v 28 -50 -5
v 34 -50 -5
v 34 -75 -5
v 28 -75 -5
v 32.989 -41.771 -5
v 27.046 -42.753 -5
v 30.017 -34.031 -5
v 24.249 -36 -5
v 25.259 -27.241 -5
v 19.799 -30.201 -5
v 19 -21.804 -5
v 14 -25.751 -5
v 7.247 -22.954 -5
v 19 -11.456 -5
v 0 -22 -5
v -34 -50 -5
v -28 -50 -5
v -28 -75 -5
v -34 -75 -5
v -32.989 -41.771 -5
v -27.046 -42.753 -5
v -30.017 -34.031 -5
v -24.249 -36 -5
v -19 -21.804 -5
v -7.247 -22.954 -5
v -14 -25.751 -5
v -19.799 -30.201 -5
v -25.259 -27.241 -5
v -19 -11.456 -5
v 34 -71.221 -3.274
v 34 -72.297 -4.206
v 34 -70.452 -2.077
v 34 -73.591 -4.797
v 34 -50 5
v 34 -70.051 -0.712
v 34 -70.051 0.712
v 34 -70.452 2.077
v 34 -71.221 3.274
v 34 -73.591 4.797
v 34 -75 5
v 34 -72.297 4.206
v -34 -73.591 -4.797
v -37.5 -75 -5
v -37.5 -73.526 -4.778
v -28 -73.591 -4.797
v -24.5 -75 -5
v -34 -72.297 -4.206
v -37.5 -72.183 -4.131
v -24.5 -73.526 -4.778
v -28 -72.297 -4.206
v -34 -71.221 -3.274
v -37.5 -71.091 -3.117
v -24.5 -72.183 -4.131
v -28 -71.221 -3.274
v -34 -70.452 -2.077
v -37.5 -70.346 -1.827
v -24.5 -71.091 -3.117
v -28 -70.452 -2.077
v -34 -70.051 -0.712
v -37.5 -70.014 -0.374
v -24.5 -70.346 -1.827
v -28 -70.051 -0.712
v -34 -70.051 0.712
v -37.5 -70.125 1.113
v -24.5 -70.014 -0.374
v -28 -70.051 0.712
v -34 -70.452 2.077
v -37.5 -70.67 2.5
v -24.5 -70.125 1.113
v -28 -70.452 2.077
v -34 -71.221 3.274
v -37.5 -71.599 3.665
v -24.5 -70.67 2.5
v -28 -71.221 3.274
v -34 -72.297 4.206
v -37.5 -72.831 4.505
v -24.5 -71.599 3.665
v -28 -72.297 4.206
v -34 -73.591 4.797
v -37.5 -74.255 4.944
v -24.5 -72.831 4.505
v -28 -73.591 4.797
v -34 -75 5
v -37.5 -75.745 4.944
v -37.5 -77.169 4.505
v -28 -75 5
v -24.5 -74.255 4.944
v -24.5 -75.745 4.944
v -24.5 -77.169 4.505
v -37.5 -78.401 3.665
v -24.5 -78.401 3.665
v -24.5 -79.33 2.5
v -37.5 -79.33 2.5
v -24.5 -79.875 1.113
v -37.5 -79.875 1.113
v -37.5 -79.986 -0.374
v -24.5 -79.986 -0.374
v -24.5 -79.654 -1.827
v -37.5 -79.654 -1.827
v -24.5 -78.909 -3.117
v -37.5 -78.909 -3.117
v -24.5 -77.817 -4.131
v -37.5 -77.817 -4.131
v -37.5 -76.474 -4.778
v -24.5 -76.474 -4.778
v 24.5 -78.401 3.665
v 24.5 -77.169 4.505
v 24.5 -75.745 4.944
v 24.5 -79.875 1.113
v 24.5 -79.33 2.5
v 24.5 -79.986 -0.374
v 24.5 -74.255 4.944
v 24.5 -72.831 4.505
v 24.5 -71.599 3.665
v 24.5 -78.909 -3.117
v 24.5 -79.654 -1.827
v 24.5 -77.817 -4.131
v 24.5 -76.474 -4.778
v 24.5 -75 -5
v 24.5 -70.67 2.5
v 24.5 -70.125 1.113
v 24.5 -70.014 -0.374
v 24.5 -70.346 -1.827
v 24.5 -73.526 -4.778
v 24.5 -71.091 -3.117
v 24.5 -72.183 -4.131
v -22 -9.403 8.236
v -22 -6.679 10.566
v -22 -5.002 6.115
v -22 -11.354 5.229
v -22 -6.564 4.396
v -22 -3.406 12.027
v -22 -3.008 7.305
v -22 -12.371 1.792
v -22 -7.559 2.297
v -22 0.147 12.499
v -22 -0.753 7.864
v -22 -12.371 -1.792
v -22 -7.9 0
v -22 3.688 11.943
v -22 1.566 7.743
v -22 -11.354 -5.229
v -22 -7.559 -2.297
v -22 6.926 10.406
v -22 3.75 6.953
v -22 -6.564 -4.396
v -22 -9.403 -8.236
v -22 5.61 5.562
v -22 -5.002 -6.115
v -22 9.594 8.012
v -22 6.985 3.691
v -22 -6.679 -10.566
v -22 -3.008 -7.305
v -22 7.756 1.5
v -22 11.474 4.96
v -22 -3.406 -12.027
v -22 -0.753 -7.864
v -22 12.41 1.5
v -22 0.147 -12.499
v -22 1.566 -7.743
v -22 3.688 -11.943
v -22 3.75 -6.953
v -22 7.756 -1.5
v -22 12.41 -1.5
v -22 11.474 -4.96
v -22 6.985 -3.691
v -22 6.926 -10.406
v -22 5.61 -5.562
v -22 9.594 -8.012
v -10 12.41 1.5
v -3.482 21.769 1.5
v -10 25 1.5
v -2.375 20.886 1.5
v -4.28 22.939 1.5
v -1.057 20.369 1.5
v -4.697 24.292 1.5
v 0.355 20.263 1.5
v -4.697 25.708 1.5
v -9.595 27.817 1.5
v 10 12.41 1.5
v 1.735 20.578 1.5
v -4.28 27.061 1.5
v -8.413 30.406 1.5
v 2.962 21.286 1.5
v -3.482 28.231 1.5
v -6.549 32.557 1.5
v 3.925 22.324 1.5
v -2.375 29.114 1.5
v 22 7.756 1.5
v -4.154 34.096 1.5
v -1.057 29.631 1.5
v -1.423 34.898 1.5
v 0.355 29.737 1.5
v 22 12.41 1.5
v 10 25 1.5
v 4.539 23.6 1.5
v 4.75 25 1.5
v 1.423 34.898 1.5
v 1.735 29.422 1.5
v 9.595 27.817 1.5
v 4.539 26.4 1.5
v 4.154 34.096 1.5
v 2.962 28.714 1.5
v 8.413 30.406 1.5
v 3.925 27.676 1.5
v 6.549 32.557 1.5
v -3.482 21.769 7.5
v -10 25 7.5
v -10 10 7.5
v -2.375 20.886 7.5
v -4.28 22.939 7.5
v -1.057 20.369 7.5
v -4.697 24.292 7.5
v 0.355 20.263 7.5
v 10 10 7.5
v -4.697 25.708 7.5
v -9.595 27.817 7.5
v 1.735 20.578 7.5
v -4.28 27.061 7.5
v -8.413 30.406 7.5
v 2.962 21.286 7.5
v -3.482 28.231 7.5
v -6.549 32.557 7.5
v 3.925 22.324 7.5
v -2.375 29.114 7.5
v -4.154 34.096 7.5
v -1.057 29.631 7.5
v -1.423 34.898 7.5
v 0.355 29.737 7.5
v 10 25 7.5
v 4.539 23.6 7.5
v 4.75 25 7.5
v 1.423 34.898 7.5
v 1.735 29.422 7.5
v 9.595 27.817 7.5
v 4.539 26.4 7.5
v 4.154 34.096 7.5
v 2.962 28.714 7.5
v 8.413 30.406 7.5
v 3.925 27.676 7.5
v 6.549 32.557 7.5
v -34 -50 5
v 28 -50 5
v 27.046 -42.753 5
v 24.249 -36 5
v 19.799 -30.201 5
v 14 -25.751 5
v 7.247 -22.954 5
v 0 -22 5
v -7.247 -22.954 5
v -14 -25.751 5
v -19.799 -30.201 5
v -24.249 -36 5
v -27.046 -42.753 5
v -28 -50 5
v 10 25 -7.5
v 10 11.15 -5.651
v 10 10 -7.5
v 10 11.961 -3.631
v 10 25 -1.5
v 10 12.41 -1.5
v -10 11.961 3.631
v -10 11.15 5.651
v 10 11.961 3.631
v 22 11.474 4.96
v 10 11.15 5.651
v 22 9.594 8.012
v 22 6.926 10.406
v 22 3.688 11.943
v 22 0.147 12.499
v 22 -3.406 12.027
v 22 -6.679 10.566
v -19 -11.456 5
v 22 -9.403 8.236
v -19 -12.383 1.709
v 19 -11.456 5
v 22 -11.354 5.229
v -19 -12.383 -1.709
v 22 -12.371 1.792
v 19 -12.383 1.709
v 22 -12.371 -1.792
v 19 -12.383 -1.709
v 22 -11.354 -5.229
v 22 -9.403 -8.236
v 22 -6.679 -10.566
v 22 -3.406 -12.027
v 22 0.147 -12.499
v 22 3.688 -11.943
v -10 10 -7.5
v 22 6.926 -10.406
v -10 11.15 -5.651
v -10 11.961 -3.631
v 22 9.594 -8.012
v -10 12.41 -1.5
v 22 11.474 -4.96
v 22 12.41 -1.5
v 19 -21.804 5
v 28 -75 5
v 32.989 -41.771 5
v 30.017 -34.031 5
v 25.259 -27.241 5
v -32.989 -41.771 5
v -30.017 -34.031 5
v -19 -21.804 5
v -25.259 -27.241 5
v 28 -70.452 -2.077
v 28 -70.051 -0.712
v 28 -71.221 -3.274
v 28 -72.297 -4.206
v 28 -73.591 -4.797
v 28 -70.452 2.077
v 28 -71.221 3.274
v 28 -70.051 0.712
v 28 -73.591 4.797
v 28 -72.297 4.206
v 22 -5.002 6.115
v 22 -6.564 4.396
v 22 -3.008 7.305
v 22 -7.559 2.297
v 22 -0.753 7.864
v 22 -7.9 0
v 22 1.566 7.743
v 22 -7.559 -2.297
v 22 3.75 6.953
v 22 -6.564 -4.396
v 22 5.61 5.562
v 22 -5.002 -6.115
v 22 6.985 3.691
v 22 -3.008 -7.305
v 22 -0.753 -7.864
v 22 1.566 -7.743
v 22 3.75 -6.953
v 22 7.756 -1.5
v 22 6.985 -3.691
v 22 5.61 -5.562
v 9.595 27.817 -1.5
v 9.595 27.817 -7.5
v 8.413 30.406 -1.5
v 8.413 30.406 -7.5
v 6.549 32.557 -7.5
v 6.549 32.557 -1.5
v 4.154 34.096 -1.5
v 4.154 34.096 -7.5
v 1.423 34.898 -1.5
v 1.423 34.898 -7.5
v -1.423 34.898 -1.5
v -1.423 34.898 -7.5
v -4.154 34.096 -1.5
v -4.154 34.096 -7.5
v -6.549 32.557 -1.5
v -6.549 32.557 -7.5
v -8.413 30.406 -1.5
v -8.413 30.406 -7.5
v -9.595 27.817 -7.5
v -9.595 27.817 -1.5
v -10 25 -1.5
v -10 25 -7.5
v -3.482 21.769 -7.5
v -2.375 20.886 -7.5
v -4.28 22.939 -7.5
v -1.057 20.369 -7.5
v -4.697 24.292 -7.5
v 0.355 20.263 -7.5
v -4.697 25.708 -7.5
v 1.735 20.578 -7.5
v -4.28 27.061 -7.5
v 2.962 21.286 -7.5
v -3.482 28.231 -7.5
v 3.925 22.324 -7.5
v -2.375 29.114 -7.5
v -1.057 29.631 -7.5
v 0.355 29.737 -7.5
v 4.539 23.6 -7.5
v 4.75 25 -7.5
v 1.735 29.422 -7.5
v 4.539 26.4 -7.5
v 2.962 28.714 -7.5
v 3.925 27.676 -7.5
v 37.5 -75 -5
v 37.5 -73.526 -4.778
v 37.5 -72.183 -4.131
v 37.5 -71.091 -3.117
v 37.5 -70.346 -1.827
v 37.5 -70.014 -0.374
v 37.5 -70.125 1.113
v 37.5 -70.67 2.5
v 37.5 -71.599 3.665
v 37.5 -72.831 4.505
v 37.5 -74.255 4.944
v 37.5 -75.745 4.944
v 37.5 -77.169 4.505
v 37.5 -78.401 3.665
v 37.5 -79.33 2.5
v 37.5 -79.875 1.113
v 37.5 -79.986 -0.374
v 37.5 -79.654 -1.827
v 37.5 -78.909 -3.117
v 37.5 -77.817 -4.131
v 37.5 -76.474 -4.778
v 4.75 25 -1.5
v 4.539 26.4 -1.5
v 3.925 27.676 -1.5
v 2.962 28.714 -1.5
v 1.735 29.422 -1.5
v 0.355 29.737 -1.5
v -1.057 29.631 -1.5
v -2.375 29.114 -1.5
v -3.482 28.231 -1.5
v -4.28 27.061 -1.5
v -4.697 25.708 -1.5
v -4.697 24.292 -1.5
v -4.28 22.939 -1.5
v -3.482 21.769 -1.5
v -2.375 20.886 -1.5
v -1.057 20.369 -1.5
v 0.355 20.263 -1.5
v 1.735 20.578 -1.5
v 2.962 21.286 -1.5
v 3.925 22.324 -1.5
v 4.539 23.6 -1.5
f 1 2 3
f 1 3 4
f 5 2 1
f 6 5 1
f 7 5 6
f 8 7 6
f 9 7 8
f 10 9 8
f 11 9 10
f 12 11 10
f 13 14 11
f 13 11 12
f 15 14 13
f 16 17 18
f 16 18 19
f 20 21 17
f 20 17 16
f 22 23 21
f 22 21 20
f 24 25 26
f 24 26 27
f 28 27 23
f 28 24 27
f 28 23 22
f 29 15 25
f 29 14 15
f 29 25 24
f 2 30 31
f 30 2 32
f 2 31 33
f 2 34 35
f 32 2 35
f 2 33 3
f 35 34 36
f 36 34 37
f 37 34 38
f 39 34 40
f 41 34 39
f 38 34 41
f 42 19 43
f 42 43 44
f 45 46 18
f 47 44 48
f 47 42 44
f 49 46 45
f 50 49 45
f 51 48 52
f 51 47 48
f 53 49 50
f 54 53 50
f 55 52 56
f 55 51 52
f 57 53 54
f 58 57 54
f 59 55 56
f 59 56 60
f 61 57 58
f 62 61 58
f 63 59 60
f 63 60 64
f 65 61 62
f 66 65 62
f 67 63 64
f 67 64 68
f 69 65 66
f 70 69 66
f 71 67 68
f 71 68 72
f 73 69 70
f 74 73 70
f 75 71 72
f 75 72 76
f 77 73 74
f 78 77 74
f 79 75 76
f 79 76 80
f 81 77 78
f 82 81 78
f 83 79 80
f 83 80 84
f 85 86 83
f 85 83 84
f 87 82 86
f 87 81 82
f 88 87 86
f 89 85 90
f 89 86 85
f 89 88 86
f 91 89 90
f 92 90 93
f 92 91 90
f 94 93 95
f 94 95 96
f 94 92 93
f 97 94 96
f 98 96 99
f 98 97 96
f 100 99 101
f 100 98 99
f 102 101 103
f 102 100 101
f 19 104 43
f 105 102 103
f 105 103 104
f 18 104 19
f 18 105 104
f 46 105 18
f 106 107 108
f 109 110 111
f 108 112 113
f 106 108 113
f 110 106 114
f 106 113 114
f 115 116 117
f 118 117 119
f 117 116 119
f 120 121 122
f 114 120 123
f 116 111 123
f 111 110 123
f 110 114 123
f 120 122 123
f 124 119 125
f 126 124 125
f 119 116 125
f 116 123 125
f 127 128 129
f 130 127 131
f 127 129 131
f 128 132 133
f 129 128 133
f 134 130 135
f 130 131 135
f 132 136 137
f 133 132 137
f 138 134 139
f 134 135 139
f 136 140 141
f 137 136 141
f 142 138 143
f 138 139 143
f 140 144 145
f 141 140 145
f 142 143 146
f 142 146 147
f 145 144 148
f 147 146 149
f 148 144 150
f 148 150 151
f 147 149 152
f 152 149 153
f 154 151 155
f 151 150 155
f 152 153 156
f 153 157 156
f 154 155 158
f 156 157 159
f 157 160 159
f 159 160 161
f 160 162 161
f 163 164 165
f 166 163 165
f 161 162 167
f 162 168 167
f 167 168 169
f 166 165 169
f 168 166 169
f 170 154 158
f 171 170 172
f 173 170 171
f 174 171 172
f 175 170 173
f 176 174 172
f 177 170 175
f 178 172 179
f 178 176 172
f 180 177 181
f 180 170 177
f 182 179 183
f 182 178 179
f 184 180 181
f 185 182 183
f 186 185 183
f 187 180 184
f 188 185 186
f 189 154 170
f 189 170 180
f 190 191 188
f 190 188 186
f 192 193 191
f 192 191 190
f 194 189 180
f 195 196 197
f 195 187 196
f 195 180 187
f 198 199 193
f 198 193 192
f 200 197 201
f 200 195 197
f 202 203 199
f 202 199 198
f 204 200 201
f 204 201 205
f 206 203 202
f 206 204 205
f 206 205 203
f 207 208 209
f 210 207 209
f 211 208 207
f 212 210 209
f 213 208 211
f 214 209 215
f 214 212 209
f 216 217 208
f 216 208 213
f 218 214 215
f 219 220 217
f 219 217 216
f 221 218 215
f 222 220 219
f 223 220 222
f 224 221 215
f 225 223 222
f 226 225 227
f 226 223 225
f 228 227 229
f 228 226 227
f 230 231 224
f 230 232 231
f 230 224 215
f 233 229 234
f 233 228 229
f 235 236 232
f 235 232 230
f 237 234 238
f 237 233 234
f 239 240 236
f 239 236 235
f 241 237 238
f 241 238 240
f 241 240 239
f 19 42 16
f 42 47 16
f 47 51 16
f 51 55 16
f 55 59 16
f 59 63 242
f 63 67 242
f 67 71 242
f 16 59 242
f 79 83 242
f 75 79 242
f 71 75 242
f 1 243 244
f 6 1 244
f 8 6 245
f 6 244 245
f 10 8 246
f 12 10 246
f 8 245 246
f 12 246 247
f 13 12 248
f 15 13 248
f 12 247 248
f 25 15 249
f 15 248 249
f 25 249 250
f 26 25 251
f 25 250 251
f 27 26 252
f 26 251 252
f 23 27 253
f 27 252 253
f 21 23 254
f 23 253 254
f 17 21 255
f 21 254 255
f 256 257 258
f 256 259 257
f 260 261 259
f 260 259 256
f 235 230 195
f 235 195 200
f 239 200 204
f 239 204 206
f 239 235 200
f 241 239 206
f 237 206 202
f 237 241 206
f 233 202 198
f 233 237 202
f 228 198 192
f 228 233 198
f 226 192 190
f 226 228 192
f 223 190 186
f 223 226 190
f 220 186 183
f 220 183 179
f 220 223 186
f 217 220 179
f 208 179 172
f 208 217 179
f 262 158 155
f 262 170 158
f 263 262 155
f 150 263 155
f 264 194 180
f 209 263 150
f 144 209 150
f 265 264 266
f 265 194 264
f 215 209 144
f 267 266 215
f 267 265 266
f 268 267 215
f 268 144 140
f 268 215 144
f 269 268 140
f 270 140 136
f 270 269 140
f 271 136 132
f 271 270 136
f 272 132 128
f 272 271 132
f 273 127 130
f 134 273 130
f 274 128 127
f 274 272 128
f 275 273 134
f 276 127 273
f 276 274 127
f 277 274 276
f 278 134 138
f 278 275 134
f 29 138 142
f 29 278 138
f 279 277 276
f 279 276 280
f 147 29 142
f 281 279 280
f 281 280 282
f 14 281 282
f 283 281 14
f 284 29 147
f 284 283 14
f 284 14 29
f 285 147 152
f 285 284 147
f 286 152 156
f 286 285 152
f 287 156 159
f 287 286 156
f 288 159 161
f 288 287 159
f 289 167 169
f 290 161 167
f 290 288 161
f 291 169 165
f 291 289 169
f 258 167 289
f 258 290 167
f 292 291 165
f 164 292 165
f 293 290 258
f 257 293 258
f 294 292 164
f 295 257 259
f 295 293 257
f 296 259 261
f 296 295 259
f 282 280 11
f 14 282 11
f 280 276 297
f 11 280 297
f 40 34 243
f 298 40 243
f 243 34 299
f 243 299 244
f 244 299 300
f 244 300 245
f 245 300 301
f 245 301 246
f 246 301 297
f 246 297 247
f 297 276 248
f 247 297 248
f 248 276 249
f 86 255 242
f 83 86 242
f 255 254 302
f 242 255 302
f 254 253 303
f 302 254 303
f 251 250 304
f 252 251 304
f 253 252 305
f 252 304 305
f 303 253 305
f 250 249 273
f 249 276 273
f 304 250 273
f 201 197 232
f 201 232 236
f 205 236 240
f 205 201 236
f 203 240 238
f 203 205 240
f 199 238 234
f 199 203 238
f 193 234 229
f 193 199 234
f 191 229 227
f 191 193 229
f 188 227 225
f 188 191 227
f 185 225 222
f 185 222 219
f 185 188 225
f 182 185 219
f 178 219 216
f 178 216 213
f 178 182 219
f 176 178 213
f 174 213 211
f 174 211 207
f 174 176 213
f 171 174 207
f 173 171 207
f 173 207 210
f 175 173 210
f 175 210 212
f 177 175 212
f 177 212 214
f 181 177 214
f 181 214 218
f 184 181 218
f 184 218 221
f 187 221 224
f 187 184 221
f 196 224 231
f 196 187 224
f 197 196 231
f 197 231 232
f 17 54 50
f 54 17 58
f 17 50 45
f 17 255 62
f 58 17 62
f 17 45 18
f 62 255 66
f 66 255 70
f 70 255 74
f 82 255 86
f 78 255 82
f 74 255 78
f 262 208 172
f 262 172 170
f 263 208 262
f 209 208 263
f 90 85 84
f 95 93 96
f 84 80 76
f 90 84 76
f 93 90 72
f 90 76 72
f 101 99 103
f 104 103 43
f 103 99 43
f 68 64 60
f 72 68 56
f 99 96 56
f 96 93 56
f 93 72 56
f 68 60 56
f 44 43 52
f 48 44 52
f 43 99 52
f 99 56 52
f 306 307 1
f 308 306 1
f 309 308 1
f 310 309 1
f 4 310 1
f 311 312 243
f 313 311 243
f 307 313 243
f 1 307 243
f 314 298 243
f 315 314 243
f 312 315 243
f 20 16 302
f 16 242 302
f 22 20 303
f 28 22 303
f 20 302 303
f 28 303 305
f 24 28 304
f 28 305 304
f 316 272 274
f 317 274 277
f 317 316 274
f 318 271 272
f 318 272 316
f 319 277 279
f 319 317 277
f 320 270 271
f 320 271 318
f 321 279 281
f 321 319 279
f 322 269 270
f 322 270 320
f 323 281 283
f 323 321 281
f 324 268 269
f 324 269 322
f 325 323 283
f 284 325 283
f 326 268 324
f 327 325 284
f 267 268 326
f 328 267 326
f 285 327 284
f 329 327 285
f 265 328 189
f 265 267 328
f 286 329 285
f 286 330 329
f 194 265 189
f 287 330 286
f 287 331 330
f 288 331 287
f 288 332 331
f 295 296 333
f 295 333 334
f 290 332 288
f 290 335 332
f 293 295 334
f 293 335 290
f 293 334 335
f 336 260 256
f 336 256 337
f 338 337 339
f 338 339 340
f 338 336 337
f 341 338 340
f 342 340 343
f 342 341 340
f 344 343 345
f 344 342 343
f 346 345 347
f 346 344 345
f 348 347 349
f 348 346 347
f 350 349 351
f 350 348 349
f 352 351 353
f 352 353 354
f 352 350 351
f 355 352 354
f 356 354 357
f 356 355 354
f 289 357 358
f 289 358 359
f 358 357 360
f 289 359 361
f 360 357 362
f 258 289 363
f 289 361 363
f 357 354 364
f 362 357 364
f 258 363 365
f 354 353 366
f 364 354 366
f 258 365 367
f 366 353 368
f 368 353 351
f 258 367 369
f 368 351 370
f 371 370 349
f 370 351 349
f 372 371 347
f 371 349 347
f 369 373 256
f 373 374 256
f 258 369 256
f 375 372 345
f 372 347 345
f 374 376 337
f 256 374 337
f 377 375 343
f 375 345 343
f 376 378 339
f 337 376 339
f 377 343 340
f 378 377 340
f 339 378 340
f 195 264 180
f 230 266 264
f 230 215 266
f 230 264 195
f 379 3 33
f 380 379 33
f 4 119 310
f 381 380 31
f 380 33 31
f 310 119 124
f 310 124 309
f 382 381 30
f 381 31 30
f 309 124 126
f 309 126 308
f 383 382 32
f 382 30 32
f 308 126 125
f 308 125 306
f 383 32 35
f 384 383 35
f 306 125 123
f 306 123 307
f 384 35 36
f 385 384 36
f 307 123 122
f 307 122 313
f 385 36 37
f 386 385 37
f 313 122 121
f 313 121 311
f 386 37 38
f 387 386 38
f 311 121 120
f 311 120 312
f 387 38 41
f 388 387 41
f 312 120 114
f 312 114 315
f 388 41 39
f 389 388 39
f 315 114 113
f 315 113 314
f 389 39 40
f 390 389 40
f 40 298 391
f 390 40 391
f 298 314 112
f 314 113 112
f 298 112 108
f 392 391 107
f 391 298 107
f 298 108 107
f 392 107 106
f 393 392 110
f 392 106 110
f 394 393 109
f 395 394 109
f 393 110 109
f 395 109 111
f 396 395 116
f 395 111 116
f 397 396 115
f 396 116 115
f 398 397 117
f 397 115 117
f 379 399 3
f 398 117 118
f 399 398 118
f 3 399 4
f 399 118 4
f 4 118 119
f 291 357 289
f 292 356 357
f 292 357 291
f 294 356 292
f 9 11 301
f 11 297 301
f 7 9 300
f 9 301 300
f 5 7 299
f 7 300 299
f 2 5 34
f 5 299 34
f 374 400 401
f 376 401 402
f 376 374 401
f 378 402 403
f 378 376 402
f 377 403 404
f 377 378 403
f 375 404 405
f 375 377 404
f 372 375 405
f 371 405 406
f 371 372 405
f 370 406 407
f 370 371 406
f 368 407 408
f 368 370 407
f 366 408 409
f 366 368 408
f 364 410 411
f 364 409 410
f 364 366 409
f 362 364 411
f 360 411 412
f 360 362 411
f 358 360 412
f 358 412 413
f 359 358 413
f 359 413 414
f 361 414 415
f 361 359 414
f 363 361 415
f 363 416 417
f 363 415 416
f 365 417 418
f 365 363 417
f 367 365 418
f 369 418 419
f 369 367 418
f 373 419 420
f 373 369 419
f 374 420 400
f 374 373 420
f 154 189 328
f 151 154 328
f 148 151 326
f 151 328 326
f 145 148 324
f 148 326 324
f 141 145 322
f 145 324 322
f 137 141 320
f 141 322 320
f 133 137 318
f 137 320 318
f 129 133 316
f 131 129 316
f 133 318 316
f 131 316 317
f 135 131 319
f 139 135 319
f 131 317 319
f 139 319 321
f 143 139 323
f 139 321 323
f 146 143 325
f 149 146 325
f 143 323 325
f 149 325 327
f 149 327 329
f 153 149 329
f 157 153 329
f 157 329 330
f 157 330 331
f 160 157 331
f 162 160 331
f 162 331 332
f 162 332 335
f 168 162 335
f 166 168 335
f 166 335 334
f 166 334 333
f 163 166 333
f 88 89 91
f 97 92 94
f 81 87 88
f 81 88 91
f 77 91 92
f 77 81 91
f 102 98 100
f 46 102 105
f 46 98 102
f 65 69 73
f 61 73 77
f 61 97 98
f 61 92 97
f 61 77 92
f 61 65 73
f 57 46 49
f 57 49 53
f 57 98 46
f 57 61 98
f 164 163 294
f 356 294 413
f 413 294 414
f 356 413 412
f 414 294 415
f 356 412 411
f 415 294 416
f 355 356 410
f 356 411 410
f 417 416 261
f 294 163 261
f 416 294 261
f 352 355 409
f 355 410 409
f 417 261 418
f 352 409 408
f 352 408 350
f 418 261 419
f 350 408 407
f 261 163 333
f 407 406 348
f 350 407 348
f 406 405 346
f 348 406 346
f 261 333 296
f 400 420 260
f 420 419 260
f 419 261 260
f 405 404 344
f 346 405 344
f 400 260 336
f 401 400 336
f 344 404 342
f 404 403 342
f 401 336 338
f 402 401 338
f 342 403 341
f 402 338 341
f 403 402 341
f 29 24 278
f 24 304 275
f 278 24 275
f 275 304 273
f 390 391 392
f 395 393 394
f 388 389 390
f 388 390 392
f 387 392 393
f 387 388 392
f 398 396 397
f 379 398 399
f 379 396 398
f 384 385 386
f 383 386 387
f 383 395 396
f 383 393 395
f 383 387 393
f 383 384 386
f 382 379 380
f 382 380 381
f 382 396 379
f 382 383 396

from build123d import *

# Parameters (mm, degrees)
SKETCH1_R           = 12.5
BOSS_EXTRUDE1_DEPTH = 22
SKETCH2_R           = 4.75
BOSS_EXTRUDE2_DEPTH = 7.5
BOSS_EXTRUDE3_DEPTH = 5
BOSS_EXTRUDE4_START = -9.5
SKETCH5_R           = 5
BOSS_EXTRUDE4_DEPTH = 13
SKETCH4_R           = 7.9
SKETCH4_W           = 3
SKETCH4_H           = 38
CUT_EXTRUDE1_DEPTH  = 101.481341552


with BuildPart() as part:
    # Sketch1 → Boss-Extrude1 (new, symmetric)
    with BuildSketch(Plane(origin=(0, 0, 0), x_dir=(0, 0, -1), z_dir=(1, 0, 0))):
        Circle(SKETCH1_R)
    extrude(amount=BOSS_EXTRUDE1_DEPTH, both=True)

    # Sketch2 → Boss-Extrude2 (add, symmetric)
    with BuildSketch(Plane.XY):
        with BuildLine():
            Line((-10, 25), (-10, 0))
            Line((-10, 0), (10, 0))
            Line((10, 0), (10, 25))
            ThreePointArc((10, 25), (0, 35), (-10, 25))
        make_face()
        with Locations((0, 25)):
            Circle(SKETCH2_R, mode=Mode.SUBTRACT)
    extrude(amount=BOSS_EXTRUDE2_DEPTH, both=True)

    # Sketch3 → Boss-Extrude3 (add, symmetric)
    with BuildSketch(Plane.XY):
        with BuildLine():
            Line((-28, -50), (-28, -75))
            Line((-28, -75), (-34, -75))
            Line((-34, -75), (-34, -50))
            ThreePointArc((-34, -50), (-30.01666204, -34.031280577), (-19, -21.80425564))
            Line((-19, -21.80425564), (-19, -8.5))
            Line((-19, -8.5), (19, -8.5))
            Line((19, -8.5), (19, -21.80425564))
            ThreePointArc((19, -21.80425564), (30.01666204, -34.031280577), (34, -50))
            Line((34, -50), (34, -75))
            Line((34, -75), (28, -75))
            Line((28, -75), (28, -50))
            ThreePointArc((28, -50), (0, -22), (-28, -50))
        make_face()
    extrude(amount=BOSS_EXTRUDE3_DEPTH, both=True)

    # Sketch5 → Boss-Extrude4 (add)
    with BuildSketch(Plane(origin=(34, 0, 0), x_dir=(0, 0, -1), z_dir=(1, 0, 0)).offset(BOSS_EXTRUDE4_START)):
        with Locations((0, -75)):
            Circle(SKETCH5_R)
    boss_extrude4 = extrude(amount=BOSS_EXTRUDE4_DEPTH)

    # Mirror1: Boss-Extrude4 across plane
    add(boss_extrude4.mirror(Plane(origin=(0, 0, 0), x_dir=(0, 0, 1), z_dir=(1, 0, 0))))

    # Sketch4 → Cut-Extrude1 (cut, through all)
    with BuildSketch(Plane(origin=(22, 0, 0), x_dir=(0, 0, -1), z_dir=(1, 0, 0))):
        Circle(SKETCH4_R)
        with Locations((0, 19)):
            Rectangle(SKETCH4_W, SKETCH4_H)
    extrude(amount=-CUT_EXTRUDE1_DEPTH, mode=Mode.SUBTRACT)


solid = part.part
